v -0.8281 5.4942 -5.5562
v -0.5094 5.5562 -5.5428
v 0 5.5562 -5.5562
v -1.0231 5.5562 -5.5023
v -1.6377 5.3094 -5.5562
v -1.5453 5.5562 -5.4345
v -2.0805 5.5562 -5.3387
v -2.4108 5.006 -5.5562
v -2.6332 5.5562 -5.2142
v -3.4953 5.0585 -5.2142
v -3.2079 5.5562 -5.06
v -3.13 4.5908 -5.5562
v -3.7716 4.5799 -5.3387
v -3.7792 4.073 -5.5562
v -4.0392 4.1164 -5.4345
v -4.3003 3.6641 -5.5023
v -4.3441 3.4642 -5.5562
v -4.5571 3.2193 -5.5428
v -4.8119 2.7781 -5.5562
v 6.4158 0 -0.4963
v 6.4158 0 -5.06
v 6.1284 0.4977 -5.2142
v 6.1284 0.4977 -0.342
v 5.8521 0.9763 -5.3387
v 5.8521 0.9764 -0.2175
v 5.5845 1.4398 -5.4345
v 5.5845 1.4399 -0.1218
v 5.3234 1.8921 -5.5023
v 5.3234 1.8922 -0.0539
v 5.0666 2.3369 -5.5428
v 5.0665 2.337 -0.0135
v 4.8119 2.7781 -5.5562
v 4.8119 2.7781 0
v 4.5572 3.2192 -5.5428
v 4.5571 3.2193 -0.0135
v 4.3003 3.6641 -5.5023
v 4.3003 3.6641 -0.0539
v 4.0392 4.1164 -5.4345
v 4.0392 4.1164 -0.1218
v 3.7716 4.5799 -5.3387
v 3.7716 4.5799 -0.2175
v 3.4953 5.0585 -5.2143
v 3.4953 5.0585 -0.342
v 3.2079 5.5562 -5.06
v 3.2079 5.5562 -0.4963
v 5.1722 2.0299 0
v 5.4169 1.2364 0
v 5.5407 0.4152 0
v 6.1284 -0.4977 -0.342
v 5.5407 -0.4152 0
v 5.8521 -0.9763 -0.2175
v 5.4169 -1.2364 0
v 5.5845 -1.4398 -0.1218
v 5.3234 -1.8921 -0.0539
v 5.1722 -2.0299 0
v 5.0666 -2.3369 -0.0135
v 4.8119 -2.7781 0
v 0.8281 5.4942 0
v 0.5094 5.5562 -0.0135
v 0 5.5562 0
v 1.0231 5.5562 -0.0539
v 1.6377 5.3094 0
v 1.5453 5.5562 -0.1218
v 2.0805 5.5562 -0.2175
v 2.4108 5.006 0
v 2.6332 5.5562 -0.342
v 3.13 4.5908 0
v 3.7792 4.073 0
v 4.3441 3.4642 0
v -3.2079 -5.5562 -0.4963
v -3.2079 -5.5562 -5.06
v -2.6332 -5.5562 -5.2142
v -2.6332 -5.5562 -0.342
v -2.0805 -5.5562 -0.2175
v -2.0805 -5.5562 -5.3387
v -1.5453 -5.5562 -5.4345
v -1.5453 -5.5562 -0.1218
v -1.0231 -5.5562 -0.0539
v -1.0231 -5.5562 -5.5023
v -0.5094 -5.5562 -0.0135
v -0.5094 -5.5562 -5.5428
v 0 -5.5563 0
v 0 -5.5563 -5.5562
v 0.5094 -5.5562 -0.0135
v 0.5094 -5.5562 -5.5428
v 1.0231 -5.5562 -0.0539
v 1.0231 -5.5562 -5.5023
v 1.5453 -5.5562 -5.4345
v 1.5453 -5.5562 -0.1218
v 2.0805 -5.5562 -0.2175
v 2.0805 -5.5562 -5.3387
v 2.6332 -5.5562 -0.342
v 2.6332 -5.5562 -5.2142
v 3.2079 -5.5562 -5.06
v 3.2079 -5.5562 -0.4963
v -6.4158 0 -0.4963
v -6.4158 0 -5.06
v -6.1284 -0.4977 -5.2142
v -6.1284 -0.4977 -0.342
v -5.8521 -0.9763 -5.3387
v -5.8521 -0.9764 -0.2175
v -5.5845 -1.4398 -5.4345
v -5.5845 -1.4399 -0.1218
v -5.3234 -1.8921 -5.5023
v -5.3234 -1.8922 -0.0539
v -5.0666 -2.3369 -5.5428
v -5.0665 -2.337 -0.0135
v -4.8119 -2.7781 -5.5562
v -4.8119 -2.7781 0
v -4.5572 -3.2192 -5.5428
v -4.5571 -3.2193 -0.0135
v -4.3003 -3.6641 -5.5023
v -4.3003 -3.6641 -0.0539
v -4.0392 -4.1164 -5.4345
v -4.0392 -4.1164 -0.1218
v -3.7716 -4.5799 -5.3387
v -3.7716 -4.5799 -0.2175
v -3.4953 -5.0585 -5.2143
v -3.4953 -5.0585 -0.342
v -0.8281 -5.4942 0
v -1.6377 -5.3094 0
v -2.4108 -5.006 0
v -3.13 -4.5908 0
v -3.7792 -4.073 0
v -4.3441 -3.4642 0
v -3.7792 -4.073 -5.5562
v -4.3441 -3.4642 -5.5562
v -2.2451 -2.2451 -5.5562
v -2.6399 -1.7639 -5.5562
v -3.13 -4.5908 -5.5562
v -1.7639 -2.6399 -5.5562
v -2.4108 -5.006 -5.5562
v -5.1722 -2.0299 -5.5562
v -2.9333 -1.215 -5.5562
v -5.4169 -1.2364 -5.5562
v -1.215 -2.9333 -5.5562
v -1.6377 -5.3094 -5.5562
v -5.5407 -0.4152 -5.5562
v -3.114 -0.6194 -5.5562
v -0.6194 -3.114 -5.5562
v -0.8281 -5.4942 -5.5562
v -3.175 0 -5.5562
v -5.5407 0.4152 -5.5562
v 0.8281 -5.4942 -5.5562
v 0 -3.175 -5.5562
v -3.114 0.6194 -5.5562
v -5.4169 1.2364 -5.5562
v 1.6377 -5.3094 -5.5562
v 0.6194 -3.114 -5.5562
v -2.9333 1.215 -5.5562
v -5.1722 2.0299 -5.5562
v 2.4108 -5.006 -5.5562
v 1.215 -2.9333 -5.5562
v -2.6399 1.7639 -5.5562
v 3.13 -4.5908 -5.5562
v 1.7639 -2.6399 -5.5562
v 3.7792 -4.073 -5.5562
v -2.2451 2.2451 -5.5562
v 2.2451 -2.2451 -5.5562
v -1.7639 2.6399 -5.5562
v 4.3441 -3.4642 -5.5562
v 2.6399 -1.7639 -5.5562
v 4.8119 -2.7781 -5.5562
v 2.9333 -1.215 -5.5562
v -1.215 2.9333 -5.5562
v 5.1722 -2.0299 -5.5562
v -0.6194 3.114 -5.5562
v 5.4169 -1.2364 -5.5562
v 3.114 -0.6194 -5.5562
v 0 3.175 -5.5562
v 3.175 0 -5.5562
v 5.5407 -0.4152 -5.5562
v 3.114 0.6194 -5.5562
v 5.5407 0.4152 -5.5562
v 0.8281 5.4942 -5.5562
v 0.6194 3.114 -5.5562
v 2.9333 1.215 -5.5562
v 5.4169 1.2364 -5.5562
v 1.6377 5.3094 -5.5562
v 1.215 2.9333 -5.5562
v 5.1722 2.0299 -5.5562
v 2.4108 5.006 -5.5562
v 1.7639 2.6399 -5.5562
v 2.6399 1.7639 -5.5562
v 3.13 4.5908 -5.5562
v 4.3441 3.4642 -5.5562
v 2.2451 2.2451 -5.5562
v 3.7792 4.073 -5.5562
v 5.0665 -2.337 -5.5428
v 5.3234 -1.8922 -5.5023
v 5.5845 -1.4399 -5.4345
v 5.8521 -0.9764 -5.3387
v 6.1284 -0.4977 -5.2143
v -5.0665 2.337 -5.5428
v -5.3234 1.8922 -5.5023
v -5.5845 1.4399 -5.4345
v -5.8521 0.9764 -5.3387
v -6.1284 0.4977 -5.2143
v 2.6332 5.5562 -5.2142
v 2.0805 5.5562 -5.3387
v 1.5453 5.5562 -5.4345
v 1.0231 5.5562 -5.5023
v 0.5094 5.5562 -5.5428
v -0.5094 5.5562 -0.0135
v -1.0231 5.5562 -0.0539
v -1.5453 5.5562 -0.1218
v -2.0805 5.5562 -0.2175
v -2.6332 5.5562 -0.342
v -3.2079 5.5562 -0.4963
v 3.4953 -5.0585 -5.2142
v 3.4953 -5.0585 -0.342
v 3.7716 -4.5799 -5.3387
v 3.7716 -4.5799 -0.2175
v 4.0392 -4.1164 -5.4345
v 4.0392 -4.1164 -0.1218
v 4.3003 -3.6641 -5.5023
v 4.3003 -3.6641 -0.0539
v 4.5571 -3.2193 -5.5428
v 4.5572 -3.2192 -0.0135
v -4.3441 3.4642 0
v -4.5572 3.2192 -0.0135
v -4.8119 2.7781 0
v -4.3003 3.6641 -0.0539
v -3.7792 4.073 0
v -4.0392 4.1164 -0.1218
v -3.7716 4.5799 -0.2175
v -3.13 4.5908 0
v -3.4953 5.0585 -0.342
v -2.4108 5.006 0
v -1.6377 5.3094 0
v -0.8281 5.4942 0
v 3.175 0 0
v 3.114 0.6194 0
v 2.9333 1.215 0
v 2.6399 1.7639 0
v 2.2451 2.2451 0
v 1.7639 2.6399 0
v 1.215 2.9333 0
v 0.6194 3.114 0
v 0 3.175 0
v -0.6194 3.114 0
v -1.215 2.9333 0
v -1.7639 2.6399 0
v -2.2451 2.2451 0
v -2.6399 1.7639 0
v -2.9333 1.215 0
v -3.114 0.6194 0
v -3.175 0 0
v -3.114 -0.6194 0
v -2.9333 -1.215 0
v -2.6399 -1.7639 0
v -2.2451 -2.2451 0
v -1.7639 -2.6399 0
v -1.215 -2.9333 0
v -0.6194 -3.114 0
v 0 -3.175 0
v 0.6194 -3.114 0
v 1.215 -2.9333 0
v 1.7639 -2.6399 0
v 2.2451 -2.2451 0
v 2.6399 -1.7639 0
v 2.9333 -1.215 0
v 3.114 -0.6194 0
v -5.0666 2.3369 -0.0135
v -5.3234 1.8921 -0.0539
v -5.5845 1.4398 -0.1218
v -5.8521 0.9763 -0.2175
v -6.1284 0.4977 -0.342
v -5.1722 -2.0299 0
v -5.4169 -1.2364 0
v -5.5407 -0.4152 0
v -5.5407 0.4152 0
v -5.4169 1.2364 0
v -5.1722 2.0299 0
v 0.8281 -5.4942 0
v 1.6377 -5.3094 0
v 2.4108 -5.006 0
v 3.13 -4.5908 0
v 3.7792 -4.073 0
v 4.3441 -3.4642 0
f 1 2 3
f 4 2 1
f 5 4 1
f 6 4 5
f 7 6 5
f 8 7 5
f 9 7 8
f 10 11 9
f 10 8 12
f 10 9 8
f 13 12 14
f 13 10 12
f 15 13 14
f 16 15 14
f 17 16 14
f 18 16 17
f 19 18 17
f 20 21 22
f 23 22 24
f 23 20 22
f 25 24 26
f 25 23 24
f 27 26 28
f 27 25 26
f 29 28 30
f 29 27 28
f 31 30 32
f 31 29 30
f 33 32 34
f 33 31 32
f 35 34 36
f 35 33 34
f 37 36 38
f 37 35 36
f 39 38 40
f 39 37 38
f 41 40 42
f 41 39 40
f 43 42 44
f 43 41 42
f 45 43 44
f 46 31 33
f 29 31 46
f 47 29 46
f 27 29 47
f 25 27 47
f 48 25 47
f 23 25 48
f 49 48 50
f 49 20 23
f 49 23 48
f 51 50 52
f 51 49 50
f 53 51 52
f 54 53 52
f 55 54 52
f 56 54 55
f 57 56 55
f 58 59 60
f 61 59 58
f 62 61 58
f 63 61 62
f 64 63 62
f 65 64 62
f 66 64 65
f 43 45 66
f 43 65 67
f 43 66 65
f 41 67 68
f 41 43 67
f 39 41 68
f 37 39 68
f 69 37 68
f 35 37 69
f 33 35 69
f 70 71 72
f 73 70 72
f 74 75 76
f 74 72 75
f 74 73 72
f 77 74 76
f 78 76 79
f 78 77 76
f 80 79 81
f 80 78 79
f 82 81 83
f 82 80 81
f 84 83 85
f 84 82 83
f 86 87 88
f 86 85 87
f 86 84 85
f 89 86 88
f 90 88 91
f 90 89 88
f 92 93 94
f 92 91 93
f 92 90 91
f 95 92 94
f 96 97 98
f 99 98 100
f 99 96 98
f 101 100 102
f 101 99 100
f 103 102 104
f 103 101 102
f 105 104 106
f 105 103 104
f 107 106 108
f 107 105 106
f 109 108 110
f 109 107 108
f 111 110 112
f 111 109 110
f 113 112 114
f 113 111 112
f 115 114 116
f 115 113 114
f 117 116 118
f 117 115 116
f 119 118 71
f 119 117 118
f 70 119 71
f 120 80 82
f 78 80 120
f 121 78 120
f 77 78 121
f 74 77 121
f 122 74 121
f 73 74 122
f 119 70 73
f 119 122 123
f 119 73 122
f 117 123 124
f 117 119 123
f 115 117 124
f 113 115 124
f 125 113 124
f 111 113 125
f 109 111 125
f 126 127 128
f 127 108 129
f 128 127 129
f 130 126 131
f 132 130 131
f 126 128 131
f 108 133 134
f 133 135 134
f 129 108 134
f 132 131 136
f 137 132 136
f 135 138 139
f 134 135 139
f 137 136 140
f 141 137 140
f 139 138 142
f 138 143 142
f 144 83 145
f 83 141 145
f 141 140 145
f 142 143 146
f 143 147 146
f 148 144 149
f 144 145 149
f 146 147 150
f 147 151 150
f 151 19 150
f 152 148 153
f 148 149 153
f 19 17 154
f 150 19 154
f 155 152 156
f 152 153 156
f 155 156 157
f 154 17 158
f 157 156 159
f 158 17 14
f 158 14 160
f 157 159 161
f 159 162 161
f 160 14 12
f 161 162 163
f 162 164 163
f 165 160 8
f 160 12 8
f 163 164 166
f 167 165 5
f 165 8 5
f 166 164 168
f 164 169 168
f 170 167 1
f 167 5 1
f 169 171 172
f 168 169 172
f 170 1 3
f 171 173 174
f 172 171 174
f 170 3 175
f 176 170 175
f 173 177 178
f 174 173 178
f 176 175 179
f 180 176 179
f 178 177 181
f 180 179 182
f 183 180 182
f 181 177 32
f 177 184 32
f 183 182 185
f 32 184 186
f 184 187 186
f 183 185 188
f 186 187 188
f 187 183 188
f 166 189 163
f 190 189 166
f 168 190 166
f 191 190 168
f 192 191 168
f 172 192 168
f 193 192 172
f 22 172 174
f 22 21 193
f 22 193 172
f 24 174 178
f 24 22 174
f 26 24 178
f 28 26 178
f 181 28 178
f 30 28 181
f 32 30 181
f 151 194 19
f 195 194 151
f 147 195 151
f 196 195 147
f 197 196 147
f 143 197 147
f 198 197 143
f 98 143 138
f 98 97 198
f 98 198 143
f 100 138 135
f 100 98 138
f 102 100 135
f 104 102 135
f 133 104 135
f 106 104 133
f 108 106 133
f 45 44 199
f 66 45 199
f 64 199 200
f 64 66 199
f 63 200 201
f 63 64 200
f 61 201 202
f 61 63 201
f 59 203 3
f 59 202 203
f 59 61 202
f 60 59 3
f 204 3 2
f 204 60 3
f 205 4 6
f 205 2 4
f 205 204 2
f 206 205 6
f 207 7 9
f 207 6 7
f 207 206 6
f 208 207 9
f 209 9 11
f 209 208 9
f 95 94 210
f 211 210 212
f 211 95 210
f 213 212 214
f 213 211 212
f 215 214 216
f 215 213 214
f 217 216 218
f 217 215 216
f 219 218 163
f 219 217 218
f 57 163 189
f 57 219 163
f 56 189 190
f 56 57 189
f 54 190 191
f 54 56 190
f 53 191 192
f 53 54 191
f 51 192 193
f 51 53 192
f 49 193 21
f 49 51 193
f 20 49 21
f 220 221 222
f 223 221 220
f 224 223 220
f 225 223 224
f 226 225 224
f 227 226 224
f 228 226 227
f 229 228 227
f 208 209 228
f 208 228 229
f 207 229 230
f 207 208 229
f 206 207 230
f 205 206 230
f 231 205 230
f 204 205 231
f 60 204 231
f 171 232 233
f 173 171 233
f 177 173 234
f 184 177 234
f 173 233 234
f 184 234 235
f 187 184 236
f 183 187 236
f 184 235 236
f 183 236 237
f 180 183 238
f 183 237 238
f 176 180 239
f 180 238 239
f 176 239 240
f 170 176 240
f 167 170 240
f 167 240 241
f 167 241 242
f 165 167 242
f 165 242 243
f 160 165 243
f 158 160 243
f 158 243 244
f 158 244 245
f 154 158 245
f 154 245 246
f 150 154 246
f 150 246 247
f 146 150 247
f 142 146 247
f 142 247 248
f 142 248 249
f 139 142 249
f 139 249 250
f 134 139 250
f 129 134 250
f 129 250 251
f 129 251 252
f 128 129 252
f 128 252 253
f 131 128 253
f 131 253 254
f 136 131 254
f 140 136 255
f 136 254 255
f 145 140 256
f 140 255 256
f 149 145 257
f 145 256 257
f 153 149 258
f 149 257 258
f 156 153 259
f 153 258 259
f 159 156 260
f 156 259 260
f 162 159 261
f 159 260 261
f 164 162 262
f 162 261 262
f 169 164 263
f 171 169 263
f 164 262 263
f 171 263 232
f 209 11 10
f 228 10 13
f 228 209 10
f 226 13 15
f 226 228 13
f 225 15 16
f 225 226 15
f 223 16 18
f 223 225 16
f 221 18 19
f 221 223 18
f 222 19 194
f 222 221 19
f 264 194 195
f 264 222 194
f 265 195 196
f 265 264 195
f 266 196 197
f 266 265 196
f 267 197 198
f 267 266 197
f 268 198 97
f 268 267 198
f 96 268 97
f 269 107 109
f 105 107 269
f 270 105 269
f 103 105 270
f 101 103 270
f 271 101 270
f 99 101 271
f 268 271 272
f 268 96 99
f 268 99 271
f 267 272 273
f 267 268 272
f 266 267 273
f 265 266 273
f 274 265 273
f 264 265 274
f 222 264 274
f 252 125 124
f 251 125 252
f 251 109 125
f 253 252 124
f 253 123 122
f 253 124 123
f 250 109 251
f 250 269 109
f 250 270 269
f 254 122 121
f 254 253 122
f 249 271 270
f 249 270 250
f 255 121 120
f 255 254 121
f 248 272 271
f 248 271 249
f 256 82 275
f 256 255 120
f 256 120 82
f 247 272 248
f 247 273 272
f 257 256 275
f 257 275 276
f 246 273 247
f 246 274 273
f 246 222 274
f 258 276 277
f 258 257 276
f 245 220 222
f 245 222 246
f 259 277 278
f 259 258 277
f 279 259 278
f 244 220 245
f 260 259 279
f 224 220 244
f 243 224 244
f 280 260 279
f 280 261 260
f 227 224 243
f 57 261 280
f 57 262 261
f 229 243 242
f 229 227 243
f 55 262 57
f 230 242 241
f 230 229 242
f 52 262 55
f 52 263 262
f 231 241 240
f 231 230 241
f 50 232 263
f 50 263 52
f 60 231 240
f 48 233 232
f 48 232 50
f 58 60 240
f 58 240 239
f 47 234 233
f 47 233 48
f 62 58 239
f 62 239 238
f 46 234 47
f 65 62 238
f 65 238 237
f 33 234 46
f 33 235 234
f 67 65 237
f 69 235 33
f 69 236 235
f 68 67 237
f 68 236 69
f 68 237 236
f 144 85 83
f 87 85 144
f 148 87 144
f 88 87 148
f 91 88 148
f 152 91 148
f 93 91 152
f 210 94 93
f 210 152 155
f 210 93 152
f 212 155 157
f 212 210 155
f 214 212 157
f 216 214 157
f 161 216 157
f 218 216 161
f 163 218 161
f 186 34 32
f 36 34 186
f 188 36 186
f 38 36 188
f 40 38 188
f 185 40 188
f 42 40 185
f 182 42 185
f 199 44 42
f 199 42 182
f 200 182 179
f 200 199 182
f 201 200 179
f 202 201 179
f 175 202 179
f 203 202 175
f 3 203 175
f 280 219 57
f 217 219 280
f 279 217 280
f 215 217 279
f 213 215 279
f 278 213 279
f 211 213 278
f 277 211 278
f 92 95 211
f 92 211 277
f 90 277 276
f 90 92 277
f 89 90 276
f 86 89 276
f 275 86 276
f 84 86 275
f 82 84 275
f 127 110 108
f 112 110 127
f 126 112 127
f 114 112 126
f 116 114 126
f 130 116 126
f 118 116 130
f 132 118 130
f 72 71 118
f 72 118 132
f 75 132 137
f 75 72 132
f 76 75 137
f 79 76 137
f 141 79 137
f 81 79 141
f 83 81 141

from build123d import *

# Parameters (mm, degrees)
BASE_EXTRUDE_DEPTH = 5.55625
SKETCH4_R          = 3.175
I_D_DEPTH          = 6.55625
SKETCH5_OUTSIDE_W  = 106.392
SKETCH5_OUTSIDE_H  = 104.672
SKETCH5_OUTSIDE_R  = 5.55625
CUT_EXTRUDE3_DEPTH = 25.4
CUT_EXTRUDE3_TAPER = 60
SKETCH6_OUTSIDE_W  = 53.046
SKETCH6_OUTSIDE_H  = 51.326
SKETCH6_OUTSIDE_R  = 5.55625
CUT_EXTRUDE4_DEPTH = 10
CUT_EXTRUDE4_TAPER = 60


with BuildPart() as part:
    # Sketch2 → Base-Extrude (new body)
    with BuildSketch(Plane.XY):
        Polygon((3.207902433, -5.55625), (6.415804866, 0), (3.207902433, 5.55625), (-3.207902433, 5.55625), (-6.415804866, 0), (-3.207902433, -5.55625), align=None)
    extrude(amount=-BASE_EXTRUDE_DEPTH)

    # Sketch4 → I.D. (cut, through all)
    with BuildSketch(Plane.XY):
        Circle(SKETCH4_R)
    extrude(amount=-I_D_DEPTH, mode=Mode.SUBTRACT)

    # Sketch5 outside → Cut-Extrude3 (cut)
    with BuildSketch(Plane(origin=(0, 0, -5.55625), x_dir=(-1, 0, 0), z_dir=(0, 0, -1))):
        Rectangle(SKETCH5_OUTSIDE_W, SKETCH5_OUTSIDE_H)
        Circle(SKETCH5_OUTSIDE_R, mode=Mode.SUBTRACT)
    extrude(amount=-CUT_EXTRUDE3_DEPTH, taper=CUT_EXTRUDE3_TAPER, mode=Mode.SUBTRACT)

    # Sketch6 outside → Cut-Extrude4 (cut)
    with BuildSketch(Plane.XY):
        Rectangle(SKETCH6_OUTSIDE_W, SKETCH6_OUTSIDE_H)
        Circle(SKETCH6_OUTSIDE_R, mode=Mode.SUBTRACT)
    extrude(amount=-CUT_EXTRUDE4_DEPTH, taper=CUT_EXTRUDE4_TAPER, mode=Mode.SUBTRACT)


solid = part.part
